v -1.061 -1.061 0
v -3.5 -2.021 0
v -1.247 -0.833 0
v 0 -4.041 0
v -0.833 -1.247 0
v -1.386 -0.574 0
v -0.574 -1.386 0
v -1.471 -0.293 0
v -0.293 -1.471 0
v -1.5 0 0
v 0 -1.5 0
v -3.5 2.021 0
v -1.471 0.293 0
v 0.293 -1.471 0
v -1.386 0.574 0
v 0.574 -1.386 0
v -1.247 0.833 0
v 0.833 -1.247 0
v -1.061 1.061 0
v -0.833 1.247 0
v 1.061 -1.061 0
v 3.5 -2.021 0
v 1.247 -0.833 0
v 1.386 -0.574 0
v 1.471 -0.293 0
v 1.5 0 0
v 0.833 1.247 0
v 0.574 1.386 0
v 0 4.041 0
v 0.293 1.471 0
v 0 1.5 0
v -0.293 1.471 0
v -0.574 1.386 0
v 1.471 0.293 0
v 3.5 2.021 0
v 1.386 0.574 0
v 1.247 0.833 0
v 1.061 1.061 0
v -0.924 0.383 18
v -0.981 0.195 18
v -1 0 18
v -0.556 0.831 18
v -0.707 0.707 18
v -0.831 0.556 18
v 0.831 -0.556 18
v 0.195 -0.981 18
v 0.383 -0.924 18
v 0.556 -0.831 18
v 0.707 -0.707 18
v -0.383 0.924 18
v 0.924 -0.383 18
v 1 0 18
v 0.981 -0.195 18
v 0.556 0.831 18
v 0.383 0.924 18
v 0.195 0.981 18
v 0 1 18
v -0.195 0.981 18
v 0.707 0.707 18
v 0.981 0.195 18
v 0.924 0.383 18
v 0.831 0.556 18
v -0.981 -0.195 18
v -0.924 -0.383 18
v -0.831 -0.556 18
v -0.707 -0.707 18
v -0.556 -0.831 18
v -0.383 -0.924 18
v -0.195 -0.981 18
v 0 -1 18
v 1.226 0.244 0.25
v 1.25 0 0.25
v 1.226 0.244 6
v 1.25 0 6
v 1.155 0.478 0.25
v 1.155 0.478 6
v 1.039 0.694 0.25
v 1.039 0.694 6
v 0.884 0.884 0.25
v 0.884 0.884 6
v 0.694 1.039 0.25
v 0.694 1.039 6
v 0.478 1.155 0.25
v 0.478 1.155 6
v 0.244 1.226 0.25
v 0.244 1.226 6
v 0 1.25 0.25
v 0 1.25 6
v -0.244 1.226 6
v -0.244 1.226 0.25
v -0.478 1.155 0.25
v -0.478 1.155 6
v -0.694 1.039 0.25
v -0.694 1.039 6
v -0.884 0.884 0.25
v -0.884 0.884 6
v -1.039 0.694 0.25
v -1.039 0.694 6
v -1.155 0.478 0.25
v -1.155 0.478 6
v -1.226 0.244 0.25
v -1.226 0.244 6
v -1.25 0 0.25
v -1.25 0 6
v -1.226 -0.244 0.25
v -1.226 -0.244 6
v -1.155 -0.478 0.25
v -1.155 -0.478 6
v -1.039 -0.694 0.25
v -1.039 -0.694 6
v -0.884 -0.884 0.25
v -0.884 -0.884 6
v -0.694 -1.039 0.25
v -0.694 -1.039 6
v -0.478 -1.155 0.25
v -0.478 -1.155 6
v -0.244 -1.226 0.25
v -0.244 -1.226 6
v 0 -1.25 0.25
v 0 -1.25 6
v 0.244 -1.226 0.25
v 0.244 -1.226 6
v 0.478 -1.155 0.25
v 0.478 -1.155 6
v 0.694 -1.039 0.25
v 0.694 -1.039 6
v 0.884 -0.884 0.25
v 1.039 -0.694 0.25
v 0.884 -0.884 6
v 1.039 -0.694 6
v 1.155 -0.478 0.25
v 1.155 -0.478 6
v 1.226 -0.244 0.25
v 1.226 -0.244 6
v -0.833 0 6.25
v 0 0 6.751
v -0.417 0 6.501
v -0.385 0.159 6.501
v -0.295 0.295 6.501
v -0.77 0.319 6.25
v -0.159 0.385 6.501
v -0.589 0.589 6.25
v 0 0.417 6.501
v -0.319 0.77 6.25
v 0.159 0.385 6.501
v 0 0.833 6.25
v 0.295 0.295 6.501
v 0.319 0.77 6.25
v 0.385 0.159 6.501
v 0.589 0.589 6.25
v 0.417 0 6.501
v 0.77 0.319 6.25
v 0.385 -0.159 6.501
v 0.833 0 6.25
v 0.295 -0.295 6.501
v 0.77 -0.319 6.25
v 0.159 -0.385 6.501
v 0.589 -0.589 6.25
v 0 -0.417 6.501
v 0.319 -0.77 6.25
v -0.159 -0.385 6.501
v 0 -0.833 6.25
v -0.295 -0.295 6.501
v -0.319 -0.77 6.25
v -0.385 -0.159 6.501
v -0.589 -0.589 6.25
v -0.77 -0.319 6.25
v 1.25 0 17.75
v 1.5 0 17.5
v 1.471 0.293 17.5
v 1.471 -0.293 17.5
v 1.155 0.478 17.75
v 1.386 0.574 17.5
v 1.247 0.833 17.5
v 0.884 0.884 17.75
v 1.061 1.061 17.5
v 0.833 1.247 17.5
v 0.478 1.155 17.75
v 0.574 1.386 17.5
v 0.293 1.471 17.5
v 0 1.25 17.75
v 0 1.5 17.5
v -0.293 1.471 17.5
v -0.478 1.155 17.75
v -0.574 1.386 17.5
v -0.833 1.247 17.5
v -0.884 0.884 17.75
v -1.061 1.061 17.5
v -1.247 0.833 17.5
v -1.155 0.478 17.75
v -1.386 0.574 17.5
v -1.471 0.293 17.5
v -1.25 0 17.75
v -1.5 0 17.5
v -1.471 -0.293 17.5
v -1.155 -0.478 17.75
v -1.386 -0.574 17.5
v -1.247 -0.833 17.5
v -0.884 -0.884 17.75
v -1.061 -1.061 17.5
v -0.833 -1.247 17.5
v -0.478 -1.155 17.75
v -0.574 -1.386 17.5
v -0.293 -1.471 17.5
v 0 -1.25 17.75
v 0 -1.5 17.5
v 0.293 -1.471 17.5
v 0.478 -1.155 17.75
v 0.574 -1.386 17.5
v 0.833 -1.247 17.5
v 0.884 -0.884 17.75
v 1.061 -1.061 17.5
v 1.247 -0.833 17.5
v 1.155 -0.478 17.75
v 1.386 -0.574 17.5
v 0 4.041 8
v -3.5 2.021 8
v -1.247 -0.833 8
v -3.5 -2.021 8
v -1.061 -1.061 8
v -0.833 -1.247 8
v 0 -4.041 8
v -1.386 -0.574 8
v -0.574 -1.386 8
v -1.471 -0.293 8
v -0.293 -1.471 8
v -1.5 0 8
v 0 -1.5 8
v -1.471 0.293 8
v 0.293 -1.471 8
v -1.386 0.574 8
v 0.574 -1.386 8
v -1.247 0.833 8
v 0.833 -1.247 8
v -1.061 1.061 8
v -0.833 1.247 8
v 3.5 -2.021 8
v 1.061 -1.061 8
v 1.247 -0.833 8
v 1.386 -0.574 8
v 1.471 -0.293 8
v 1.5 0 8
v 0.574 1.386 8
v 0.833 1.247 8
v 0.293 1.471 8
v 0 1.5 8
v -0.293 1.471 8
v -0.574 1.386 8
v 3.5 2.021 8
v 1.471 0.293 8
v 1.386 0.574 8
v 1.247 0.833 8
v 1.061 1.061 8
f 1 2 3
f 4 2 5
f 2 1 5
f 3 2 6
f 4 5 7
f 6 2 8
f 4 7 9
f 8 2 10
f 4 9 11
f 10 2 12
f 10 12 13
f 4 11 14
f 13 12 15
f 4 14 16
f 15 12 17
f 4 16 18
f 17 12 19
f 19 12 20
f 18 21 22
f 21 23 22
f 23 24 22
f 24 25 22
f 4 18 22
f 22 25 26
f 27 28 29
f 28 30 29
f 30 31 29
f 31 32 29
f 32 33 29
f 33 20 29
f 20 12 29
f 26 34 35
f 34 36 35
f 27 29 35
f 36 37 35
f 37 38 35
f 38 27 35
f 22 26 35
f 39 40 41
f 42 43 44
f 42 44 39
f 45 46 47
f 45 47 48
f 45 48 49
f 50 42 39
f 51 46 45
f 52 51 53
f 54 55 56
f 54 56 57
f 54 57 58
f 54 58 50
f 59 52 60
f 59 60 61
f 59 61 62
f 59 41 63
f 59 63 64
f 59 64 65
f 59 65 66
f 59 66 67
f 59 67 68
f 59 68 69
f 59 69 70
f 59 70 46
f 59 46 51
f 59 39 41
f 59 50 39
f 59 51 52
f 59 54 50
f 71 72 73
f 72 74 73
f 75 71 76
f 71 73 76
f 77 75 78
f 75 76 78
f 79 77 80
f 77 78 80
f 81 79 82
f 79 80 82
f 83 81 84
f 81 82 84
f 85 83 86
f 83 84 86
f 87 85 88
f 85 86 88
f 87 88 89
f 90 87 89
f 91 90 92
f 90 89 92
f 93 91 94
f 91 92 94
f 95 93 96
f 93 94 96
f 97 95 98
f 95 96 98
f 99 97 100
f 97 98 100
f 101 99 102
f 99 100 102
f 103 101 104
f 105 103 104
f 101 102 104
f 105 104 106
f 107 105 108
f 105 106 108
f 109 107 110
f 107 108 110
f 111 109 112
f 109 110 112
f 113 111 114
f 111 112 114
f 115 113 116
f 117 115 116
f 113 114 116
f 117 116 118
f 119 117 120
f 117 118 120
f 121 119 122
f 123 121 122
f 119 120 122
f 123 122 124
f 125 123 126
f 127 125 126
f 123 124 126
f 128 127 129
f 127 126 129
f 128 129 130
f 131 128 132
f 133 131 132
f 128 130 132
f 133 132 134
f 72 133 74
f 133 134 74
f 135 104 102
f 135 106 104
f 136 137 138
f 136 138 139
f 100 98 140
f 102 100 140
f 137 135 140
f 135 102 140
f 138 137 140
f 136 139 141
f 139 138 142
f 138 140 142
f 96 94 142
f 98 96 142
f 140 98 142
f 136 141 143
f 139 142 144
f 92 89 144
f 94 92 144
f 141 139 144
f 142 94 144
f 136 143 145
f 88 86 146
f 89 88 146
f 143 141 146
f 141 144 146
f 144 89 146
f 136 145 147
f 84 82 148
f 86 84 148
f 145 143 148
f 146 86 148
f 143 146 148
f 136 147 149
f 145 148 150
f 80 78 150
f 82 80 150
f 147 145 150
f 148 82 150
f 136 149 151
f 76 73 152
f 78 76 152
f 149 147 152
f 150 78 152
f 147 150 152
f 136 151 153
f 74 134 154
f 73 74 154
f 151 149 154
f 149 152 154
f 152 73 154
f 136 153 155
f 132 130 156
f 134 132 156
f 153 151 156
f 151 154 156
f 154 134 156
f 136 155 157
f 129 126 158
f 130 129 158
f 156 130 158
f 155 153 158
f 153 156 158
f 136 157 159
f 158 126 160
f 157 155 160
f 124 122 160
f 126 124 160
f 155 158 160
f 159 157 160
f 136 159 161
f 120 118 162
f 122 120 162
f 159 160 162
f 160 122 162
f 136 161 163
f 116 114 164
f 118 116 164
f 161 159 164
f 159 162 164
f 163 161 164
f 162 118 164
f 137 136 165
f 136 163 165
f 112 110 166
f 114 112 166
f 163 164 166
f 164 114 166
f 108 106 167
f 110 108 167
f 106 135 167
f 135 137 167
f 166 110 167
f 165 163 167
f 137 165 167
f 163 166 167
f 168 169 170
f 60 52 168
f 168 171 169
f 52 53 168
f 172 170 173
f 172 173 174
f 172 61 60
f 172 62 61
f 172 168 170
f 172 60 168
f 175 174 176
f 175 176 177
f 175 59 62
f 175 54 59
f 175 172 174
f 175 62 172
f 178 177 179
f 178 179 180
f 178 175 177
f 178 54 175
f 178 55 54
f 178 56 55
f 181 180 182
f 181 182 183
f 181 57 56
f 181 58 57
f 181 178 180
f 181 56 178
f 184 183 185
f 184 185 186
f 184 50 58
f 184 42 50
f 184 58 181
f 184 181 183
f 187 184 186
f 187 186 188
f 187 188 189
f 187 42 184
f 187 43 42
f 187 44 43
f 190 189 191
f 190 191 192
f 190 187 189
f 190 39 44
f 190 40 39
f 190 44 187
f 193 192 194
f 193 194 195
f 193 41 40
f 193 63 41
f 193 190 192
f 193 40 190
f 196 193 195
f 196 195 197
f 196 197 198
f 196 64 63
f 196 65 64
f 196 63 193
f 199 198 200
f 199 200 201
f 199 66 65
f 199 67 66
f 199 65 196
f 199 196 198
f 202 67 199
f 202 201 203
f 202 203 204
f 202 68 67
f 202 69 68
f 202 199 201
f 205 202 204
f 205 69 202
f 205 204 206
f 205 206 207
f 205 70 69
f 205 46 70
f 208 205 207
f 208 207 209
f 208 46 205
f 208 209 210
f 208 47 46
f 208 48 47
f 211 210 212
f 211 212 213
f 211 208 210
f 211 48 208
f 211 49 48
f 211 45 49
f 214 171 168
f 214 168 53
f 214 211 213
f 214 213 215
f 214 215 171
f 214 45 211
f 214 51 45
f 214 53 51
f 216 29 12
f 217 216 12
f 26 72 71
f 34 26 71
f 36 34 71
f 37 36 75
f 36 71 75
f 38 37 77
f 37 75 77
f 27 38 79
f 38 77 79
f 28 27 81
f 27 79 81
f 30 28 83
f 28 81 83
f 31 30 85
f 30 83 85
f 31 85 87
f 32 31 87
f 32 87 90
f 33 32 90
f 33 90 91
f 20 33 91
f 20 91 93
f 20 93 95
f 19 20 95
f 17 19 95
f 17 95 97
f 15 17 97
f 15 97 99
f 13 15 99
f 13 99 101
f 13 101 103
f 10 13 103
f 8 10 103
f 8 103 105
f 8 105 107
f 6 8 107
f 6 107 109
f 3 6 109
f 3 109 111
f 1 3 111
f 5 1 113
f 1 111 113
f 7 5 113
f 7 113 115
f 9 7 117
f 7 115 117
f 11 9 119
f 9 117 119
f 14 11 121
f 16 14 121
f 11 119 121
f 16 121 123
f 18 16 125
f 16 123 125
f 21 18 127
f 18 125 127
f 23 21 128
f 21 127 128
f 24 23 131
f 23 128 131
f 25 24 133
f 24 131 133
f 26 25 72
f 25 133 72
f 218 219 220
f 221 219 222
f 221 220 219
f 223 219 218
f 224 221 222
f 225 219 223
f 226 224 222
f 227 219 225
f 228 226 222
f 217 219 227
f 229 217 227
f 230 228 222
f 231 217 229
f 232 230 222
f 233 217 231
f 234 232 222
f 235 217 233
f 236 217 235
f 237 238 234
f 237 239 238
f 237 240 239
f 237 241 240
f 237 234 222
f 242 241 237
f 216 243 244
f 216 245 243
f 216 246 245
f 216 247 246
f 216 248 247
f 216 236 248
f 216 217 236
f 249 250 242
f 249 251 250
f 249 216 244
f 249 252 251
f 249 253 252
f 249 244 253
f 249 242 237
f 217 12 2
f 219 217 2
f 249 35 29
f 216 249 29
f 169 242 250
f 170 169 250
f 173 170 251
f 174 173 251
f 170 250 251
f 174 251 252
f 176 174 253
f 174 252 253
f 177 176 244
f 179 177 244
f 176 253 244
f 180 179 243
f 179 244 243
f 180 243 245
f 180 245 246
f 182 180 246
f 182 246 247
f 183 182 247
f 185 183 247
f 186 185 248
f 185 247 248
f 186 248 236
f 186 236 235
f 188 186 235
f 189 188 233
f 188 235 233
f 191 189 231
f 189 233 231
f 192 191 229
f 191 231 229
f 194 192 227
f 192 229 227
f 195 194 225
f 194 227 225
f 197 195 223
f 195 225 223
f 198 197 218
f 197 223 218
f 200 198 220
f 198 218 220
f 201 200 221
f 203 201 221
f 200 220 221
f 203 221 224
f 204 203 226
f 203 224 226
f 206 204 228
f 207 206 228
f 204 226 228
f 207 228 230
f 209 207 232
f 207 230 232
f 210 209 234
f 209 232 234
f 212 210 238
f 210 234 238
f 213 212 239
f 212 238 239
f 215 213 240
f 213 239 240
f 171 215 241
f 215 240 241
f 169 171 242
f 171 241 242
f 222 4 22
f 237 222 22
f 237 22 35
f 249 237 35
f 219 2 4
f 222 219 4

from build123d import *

# Parameters (mm, degrees)
EXTRUDE_1_DEPTH     = 8
SKETCH_2_R          = 1.5
EXTRUDE_2_DEPTH     = 10
M3X0_51_D           = 2.5
M3X0_51_DEPTH       = 6
M3X0_51_CSINK_D     = 3
M3X0_51_CSINK_ANGLE = 90
M3X0_51_TIP         = 0.751075774
CHAMFER_1_SIZE      = 0.5


with BuildPart() as part:
    # Эскиз1 → Вытянуть1 (new body)
    with BuildSketch(Plane.XY):
        Polygon((0, 4.041451884), (-3.5, 2.020725942), (-3.5, -2.020725942), (0, -4.041451884), (3.5, -2.020725942), (3.5, 2.020725942), align=None)
    extrude(amount=EXTRUDE_1_DEPTH)

    # Эскиз2 → Вытянуть2 (add)
    with BuildSketch(Plane.XY.offset(8)):
        Circle(SKETCH_2_R)
    extrude(amount=EXTRUDE_2_DEPTH)

    # Сверление под метчик M3x0.51
    with Locations(Plane(origin=(0, 0, 0), x_dir=(-1, 0, 0), z_dir=(0, 0, -1))):
        with Locations((0, 0)):
            CounterSinkHole(M3X0_51_D / 2, M3X0_51_CSINK_D / 2, depth=M3X0_51_DEPTH, counter_sink_angle=M3X0_51_CSINK_ANGLE)
            with Locations((0, 0, -(M3X0_51_DEPTH + M3X0_51_TIP / 2))):  # 118° drill point
                Cone(0, M3X0_51_D / 2, M3X0_51_TIP, mode=Mode.SUBTRACT)

    # Фаска1
    chamfer_1_edges = [part.edges().sort_by_distance(p)[0] for p in [
        (-1.5, 0, 18),
    ]]
    chamfer(chamfer_1_edges, length=CHAMFER_1_SIZE)


solid = part.part
